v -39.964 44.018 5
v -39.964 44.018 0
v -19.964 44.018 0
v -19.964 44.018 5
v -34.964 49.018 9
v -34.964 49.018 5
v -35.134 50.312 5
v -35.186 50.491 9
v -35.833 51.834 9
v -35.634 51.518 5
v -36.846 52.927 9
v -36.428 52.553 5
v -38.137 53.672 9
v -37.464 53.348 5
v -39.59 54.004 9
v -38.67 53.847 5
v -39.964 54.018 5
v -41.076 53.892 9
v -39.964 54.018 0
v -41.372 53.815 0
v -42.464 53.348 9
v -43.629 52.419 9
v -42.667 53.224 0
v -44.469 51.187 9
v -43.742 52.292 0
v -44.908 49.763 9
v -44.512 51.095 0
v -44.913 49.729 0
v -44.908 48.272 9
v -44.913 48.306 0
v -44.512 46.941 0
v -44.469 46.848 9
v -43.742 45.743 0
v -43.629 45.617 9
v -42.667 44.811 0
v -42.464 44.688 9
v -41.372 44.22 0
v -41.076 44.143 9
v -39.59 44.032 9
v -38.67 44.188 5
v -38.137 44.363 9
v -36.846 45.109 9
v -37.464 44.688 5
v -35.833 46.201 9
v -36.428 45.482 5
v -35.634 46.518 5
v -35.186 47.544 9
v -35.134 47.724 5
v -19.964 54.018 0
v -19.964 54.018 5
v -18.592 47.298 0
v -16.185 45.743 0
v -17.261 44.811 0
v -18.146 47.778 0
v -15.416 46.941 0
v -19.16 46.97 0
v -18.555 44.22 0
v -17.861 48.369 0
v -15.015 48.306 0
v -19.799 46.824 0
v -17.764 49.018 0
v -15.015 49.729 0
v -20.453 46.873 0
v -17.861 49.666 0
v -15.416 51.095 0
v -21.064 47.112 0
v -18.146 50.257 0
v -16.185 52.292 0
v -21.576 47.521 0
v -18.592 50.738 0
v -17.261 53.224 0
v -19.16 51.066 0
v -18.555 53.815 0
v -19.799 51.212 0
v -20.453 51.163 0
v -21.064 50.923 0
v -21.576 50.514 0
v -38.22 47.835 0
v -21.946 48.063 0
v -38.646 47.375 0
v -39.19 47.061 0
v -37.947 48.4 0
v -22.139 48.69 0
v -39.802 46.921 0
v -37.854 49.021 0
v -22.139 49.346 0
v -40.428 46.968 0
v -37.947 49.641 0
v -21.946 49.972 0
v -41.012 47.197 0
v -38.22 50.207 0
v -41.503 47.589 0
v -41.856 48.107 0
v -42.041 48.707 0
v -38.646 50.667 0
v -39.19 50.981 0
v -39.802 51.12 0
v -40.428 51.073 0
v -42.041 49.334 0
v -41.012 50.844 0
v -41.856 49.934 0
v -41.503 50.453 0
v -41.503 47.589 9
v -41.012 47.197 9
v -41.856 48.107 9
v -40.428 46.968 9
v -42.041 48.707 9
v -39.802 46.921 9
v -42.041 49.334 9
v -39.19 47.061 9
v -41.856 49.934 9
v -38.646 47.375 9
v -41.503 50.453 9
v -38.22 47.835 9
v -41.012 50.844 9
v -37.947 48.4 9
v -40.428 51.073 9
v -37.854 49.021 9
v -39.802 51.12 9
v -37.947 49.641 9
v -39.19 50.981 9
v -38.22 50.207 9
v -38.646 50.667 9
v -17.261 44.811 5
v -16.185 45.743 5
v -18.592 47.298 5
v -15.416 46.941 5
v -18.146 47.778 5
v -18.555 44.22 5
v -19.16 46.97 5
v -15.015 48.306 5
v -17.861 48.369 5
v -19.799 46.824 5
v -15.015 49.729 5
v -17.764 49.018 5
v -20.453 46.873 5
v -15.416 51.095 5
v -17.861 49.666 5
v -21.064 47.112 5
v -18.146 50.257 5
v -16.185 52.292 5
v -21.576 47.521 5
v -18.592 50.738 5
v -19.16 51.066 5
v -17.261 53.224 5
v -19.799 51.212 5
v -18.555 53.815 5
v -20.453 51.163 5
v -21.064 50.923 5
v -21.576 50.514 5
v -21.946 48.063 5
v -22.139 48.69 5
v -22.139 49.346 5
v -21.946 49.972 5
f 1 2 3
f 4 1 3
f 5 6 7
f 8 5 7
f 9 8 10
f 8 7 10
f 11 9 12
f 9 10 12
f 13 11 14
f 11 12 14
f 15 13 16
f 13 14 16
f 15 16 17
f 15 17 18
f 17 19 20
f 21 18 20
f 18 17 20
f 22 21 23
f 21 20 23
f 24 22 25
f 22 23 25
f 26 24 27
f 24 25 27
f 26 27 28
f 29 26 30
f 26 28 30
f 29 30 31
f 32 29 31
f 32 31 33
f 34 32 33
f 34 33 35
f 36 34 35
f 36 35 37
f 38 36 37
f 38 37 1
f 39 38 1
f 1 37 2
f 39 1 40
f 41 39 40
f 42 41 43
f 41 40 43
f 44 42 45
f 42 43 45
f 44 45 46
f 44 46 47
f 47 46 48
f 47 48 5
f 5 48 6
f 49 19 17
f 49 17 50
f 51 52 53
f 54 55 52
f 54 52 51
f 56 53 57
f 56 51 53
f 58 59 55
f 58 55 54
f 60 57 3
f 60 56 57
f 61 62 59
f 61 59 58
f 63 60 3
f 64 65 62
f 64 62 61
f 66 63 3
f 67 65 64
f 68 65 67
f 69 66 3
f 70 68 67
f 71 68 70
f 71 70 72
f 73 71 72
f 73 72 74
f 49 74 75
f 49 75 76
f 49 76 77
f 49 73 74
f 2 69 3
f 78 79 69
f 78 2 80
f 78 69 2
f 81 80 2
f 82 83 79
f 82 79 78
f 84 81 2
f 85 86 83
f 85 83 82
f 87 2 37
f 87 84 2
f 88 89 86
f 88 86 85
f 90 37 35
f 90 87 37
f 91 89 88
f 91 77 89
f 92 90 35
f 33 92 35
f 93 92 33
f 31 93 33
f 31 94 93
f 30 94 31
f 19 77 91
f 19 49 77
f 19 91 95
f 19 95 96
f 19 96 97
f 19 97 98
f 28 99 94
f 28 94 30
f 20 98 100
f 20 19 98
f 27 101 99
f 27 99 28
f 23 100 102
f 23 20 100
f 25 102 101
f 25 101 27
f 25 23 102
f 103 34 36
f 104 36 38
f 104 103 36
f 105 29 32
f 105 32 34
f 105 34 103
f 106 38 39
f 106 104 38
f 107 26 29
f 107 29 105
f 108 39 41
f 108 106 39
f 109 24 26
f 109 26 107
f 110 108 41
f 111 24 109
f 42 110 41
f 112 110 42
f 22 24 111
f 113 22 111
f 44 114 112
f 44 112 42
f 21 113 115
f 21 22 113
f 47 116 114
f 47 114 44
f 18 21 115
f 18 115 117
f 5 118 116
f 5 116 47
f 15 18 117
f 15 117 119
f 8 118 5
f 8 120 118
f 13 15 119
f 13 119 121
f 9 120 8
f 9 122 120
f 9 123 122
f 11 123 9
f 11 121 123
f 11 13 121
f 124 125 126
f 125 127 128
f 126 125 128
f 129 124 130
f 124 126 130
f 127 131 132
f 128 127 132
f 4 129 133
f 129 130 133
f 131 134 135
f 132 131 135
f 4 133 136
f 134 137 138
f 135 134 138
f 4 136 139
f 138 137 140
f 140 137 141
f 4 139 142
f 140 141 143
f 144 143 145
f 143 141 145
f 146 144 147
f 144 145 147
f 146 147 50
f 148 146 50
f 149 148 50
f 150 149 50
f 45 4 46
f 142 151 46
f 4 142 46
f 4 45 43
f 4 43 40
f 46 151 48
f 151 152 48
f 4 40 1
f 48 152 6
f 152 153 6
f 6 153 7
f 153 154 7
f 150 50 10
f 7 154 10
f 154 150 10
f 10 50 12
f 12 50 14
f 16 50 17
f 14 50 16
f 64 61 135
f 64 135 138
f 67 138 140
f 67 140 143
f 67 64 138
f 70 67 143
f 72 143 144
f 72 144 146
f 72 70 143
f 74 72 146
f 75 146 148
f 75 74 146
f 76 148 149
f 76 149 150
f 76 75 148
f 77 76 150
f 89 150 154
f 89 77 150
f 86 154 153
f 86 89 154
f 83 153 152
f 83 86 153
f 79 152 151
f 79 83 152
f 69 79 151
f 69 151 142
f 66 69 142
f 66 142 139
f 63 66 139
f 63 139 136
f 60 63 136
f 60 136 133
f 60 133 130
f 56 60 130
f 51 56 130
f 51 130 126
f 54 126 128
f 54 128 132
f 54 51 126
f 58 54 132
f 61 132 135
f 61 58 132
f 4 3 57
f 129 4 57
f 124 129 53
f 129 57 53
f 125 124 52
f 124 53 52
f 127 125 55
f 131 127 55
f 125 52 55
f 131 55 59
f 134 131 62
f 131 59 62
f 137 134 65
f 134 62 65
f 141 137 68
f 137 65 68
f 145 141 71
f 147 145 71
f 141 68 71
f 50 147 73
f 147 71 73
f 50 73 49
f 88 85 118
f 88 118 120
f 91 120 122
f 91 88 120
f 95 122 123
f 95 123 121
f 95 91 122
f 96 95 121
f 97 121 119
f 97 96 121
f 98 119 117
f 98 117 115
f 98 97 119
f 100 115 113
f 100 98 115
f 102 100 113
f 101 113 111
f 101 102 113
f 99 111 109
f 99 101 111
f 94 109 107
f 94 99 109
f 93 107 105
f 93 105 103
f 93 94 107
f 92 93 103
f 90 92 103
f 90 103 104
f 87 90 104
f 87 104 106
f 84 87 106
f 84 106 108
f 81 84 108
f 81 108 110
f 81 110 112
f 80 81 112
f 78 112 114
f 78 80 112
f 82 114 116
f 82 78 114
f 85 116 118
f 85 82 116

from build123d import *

# Parameters (mm, degrees)
SKETCH005_R      = 5
SKETCH005_R_2    = 2.105463
EXTRUDE004_DEPTH = 9
SKETCH004_R      = 2.2
EXTRUDE003_DEPTH = 5


with BuildPart() as psu_one_hole_extrude:
    # Sketch005 → Extrude004 (new body)
    with BuildSketch(Plane.XY):
        with Locations((-39.96372, 49.017672)):
            Circle(SKETCH005_R)
        with Locations((-39.959132, 49.020638)):
            Circle(SKETCH005_R_2, mode=Mode.SUBTRACT)
    extrude(amount=EXTRUDE004_DEPTH)


with BuildPart() as psu_two_hole_tab_fusion:
    # Sketch004 → Extrude003 (new body)
    with BuildSketch(Plane.XY):
        with BuildLine():
            Line((-39.96372, 54.017672), (-19.96372, 54.017672))
            ThreePointArc((-19.96372, 44.017672), (-14.96372, 49.017672), (-19.96372, 54.017672))
            Line((-39.96372, 44.017672), (-19.96372, 44.017672))
            ThreePointArc((-39.96372, 54.017672), (-44.96372, 49.017672), (-39.96372, 44.017672))
        make_face()
        with Locations((-39.96372, 49.017672)):
            Circle(SKETCH004_R, mode=Mode.SUBTRACT)
        with Locations((-19.96372, 49.017672)):
            Circle(SKETCH004_R, mode=Mode.SUBTRACT)
    extrude(amount=EXTRUDE003_DEPTH)

    # Fusion008: union psu one hole extrude
    add(psu_one_hole_extrude.part)


solid = psu_two_hole_tab_fusion.part
